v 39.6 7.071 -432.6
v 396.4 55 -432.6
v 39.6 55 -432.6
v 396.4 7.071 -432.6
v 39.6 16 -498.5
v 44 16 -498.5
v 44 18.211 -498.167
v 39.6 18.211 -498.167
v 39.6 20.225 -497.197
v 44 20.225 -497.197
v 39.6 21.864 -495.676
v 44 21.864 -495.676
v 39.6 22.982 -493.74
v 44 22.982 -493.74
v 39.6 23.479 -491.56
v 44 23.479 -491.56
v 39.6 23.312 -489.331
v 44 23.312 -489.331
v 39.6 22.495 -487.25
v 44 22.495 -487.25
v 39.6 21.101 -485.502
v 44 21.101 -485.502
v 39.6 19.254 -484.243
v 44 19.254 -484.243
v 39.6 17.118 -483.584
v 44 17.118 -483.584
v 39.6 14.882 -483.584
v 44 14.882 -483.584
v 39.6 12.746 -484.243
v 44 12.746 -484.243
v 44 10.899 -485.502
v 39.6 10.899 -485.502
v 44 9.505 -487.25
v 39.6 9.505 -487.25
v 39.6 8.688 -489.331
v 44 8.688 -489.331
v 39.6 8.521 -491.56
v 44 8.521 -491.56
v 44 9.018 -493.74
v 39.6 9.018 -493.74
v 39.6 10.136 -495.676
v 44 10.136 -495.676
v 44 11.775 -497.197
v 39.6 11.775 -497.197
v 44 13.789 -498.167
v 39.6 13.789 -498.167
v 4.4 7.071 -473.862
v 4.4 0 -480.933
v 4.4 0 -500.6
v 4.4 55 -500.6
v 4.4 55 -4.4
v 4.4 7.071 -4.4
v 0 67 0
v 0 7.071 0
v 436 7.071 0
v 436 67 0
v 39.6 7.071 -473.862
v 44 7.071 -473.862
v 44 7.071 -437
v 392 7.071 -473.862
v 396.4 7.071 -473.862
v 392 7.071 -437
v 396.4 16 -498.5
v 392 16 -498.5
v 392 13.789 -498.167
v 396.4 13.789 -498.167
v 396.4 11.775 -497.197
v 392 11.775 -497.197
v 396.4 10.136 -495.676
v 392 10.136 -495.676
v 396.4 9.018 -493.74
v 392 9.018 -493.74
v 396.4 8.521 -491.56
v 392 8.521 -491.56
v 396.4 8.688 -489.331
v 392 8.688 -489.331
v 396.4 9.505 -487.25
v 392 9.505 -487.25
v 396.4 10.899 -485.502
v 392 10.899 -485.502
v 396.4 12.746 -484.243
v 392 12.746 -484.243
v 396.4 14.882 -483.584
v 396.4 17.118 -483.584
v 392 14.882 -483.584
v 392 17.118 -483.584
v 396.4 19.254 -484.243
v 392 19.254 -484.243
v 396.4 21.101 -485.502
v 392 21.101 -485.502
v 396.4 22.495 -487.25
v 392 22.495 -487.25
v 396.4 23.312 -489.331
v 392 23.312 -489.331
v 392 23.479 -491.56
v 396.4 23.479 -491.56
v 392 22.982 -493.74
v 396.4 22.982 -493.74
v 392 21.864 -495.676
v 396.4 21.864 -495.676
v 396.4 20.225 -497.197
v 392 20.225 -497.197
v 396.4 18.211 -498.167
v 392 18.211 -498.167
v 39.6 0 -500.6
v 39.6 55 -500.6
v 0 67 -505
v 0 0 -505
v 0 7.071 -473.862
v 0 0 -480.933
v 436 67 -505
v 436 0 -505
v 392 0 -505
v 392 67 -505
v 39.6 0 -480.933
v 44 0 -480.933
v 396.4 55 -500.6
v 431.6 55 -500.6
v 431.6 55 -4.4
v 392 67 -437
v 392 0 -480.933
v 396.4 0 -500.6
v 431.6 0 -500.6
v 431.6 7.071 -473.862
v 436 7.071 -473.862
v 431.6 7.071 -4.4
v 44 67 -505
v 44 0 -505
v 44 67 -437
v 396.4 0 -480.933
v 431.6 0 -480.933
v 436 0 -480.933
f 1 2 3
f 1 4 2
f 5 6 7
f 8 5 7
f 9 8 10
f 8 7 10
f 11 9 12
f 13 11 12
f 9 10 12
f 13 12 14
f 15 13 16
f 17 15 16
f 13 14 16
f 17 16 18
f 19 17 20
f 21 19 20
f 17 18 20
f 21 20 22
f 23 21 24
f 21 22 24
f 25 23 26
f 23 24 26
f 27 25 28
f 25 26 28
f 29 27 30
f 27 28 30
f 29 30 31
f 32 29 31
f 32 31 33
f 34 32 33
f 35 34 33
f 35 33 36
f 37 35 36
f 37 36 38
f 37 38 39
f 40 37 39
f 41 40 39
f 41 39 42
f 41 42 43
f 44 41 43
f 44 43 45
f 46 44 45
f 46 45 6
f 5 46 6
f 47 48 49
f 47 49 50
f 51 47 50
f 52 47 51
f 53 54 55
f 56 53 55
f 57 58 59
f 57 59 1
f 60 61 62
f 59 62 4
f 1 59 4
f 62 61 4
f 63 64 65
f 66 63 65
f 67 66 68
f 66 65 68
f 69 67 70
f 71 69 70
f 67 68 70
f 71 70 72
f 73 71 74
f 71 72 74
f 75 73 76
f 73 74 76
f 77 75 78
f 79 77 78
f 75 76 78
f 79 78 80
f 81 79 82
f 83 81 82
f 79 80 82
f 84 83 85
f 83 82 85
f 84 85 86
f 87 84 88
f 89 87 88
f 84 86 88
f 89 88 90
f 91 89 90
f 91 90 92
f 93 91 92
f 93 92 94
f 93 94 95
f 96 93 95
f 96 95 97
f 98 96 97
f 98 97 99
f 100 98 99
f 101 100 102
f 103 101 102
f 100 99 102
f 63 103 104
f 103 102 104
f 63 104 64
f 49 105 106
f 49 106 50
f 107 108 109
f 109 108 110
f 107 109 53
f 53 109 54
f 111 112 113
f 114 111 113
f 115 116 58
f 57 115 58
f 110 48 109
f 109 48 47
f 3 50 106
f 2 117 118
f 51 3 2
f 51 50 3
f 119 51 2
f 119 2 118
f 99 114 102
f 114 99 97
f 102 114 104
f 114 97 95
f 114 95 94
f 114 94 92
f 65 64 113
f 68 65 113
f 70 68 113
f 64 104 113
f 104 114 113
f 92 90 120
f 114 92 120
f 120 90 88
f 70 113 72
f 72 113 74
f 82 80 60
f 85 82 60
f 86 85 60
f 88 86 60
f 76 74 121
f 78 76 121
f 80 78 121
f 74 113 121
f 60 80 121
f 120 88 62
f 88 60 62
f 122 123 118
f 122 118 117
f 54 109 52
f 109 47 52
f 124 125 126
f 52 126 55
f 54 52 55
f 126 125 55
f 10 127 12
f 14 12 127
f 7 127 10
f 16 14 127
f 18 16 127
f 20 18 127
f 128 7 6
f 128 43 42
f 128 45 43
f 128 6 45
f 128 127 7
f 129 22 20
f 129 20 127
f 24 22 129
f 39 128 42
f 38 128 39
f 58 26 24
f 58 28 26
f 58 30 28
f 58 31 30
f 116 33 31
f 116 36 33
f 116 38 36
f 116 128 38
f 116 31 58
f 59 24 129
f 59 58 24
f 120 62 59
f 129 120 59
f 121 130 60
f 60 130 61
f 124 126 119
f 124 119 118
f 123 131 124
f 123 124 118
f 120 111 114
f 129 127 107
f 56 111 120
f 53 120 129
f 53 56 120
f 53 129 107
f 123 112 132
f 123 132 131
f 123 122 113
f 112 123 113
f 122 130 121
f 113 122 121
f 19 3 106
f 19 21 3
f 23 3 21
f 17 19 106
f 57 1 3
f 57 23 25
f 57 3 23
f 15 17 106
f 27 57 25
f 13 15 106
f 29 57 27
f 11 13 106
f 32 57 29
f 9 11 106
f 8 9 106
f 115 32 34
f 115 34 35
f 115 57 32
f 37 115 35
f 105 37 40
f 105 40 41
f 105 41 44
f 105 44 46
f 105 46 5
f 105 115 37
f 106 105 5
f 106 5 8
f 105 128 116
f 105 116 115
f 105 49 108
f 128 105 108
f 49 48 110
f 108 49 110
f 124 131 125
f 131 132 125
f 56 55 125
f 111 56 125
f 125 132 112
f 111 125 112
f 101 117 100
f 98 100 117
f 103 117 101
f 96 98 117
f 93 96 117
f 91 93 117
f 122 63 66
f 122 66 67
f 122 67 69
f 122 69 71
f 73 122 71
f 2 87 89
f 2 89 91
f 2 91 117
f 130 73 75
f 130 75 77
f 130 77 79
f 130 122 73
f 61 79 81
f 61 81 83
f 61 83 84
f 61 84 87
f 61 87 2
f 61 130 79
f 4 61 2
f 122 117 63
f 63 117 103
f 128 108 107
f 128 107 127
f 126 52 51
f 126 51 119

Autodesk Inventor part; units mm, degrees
ref_plane "YZ Plane" through (0, 0, 0) normal (1, 0, 0) x (0, 1, 0)
ref_plane "XZ Plane" through (0, 0, 0) normal (0, 1, 0) x (-1, 0, 0)
ref_plane "XY Plane" through (0, 0, 0) normal (0, 0, 1) x (1, 0, 0)
sketch "Sketch1" plane through (0, 0, 0) normal (0, 1, 0) x (-1, 0, 0)
  line L0 (0, 0) -> (-436, 0)
  line L1 (-436, 0) -> (-436, -437)
  line L2 (-392, -437) -> (-44, -437)
  line L3 (0, -437) -> (0, 0)
  line L4 (0, -437) -> (0, -505)
  line L5 (0, -505) -> (-44, -505)
  line L6 (-44, -505) -> (-44, -437)
  line L7 (-436, -437) -> (-436, -505)
  line L8 (-436, -505) -> (-392, -505)
  line L9 (-392, -505) -> (-392, -437)
  dimension "d0" = 436
  dimension "d1" = 437
  dimension "d2" = 68
  dimension "d3" = 44
  dimension "d4" = 68
  dimension "d5" = 68
  dimension "d6" = 44
  dimension "d7" = 68
extrude "Extrusion1" add sketch "Sketch1" along normal blind 67
sketch "Sketch4" plane through (436, 0, 0) normal (1, 0, 0) x (0, 0, -1)
  line L0 (504.9333, 0) -> (480.9333, 0)
  line L1 (505, 0) -> (437, 0) projected
  line L2 (480.9333, 0) -> (473.8622, 7.0711)
  line L3 (473.8622, 7.0711) -> (0, 7.0711)
  line L4 (0, 0) -> (0, 67) projected
  line L5 (0, 7.0711) -> (0, 0)
  line L6 (0, 0) -> (480.9333, 0)
  dimension "d13" = 24
  dimension "d14" = 10
  dimension "d15" = 135
extrude "Extrusion2" cut sketch "Sketch4" against normal through all
sketch "Sketch5" plane through (0, 0, 0) normal (0, -1, 0) x (1, 0, 0)
  line L0 (0, 0) -> (436, 0) projected
  line L1 (436, 0) -> (0, 0)
  line L2 (0, -505) -> (0, -480.9333) projected
  line L3 (0, 0) -> (0, -505)
  line L4 (44, -505) -> (0, -505) projected
  line L5 (0, -505) -> (44, -505)
  line L6 (44, -437) -> (44, -505) projected
  line L7 (44, -505) -> (44, -437)
  line L8 (392, -505) -> (392, -437) projected
  line L9 (44, -437) -> (392, -437)
  line L10 (392, -437) -> (392, -505)
  line L11 (436, -505) -> (392, -505) projected
  line L12 (392, -505) -> (436, -505)
  line L13 (436, 0) -> (436, -505) projected
  line L14 (436, -505) -> (436, 0)
  line L15 (396.4, -432.6) -> (39.6, -432.6)
  line L16 (39.6, -432.6) -> (39.6, -500.6)
  line L17 (39.6, -500.6) -> (4.4, -500.6)
  line L18 (4.4, -500.6) -> (4.4, -4.4)
  line L19 (4.4, -4.4) -> (431.6, -4.4)
  line L20 (431.6, -4.4) -> (431.6, -500.6)
  line L21 (431.6, -500.6) -> (396.4, -500.6)
  line L22 (396.4, -500.6) -> (396.4, -432.6)
  dimension "d18" = 4.4
extrude "Extrusion3" cut sketch "Sketch5" against normal blind 55 contours L15 L16 L17 L18 L19 L20 L21 L22
sketch "Sketch3" plane through (44, 0, -437) normal (1, 0, 0) x (0, 0, -1)
  circle A0 centre (54, 16) radius 7.5
  line L0 (0, 0) -> (0, 67) projected
  line L1 (0, 0) -> (68, 0) projected
  point P0 (-437, 0)
  dimension "d10" = 15
  dimension "d11" = 54
  dimension "d12" = 16
extrude "Extrusion4" cut sketch "Sketch3" along normal blind 367.5 and the other way blind 27.5
properties part number "bin_lid"
